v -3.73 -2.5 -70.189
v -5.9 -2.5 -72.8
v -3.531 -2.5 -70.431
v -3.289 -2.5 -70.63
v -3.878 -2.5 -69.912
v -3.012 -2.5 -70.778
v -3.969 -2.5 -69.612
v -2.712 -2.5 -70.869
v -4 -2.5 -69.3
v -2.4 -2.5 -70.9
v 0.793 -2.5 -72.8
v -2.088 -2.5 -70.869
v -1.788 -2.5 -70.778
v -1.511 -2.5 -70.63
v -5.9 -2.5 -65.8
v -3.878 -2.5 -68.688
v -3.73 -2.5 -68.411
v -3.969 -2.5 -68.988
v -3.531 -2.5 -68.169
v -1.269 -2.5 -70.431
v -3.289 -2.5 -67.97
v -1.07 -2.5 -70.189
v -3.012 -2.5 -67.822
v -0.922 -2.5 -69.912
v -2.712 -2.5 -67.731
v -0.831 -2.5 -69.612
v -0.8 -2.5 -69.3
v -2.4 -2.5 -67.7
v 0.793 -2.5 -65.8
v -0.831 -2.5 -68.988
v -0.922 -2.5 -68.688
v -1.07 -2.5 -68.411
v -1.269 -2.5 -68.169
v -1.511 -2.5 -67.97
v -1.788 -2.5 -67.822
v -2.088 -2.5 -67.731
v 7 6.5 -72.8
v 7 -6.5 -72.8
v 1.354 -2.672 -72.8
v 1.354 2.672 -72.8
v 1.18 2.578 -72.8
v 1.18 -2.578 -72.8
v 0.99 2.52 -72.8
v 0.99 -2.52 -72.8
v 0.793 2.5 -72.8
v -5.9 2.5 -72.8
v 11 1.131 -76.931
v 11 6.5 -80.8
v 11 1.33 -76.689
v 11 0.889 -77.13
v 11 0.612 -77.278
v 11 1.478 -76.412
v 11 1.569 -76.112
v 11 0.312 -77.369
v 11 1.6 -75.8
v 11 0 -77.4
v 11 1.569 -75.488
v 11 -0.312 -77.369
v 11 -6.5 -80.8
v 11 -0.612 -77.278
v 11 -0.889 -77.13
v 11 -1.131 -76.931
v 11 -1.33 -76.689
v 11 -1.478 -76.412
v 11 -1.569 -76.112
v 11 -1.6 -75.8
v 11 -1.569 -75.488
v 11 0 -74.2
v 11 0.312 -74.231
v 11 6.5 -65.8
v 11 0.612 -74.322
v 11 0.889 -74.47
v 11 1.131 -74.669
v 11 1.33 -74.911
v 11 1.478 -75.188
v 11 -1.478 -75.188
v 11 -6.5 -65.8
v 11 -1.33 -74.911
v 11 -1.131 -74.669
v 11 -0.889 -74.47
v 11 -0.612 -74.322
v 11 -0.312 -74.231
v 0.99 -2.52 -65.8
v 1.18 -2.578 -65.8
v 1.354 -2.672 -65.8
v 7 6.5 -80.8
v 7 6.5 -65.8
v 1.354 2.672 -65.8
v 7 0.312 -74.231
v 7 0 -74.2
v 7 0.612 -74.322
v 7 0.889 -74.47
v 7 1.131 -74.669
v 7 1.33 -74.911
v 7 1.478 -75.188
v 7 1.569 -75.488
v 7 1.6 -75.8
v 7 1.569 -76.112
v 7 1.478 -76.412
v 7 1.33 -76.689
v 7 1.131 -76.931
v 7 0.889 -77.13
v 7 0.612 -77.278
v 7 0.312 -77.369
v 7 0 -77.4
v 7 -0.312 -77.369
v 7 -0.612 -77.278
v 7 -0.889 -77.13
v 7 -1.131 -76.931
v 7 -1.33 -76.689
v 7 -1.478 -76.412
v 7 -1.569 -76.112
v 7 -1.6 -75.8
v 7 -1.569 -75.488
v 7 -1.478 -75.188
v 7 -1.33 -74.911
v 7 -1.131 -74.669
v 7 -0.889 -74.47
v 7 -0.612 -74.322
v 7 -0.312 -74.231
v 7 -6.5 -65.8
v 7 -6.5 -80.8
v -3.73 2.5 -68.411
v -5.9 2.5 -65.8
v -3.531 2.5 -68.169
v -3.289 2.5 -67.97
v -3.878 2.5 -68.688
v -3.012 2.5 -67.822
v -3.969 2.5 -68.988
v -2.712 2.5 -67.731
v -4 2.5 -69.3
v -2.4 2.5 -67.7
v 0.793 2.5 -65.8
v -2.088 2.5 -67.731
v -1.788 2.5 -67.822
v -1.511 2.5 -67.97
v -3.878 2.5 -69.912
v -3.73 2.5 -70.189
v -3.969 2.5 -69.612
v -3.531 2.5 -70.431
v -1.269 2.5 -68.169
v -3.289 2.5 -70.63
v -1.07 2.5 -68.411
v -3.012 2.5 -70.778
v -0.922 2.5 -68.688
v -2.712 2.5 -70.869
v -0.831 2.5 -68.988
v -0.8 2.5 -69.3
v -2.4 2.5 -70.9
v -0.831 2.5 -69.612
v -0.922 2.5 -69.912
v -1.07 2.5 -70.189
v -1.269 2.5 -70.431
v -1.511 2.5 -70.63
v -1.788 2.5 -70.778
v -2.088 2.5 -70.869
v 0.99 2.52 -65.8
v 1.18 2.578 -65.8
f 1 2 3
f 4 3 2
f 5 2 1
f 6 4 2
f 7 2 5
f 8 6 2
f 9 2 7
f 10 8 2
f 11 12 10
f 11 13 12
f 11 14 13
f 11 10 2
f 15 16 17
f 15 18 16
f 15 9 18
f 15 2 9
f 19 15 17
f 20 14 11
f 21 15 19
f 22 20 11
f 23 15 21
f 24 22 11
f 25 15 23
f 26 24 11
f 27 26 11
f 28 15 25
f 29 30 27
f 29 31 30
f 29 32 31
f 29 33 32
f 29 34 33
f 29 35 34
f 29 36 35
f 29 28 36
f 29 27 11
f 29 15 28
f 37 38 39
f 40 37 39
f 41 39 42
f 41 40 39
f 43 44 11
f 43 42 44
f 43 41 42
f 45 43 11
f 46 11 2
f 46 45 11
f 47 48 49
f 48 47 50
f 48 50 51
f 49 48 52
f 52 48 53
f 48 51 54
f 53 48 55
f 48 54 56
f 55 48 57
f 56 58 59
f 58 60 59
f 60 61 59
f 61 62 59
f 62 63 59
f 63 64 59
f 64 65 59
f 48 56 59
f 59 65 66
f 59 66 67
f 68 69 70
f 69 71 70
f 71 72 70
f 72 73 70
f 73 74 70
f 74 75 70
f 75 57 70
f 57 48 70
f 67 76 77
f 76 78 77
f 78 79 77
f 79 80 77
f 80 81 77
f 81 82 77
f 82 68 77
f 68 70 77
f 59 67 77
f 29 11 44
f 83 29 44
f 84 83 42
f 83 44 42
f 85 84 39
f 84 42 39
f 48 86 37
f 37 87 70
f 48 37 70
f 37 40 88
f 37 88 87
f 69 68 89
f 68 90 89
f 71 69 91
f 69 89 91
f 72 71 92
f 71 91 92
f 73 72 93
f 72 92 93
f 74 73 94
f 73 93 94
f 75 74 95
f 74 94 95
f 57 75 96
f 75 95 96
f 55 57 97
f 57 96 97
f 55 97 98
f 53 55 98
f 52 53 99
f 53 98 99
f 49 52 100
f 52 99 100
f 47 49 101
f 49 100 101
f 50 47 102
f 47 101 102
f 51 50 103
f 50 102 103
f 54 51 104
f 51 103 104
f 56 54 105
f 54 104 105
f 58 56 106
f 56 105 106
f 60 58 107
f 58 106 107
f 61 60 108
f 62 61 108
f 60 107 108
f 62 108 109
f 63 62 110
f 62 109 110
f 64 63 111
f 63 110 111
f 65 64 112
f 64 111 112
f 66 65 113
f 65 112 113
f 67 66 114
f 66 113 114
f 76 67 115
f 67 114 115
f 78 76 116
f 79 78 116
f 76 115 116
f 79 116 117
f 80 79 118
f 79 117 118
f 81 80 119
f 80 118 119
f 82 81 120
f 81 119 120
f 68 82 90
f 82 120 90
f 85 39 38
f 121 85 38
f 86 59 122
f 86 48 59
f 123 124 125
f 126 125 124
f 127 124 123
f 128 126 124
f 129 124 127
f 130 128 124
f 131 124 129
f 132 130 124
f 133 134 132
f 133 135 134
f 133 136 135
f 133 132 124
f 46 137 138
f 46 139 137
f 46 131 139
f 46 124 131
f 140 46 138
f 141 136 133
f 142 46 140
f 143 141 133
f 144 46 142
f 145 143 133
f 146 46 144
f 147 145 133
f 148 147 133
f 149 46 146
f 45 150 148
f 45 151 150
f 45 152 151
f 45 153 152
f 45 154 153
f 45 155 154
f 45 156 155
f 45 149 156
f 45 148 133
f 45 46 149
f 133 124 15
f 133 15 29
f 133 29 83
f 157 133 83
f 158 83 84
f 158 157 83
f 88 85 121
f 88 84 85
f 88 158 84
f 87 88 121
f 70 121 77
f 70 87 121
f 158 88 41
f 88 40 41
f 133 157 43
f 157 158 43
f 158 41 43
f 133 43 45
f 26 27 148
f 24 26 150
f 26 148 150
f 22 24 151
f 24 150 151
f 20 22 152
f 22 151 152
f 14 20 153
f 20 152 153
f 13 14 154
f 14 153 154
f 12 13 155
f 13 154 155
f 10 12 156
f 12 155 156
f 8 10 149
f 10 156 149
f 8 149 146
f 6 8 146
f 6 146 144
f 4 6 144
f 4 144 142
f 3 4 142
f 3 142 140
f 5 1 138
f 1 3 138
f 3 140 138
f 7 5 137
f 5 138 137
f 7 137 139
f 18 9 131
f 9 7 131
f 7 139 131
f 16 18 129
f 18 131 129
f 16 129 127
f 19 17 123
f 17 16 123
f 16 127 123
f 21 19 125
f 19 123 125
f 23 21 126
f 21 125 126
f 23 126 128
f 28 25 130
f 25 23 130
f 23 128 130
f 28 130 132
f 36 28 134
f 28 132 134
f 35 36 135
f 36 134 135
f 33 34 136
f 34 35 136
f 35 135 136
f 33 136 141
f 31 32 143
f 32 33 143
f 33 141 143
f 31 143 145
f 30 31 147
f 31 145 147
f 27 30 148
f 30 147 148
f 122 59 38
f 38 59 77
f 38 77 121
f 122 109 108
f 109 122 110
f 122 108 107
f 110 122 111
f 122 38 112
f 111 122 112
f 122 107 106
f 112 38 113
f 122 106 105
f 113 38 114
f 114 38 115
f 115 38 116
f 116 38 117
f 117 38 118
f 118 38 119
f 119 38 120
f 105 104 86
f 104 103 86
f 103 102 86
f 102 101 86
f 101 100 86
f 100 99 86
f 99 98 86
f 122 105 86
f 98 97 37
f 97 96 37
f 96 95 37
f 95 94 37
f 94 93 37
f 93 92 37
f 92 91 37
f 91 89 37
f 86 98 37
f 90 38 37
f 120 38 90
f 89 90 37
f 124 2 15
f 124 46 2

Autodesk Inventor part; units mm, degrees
ref_plane "YZ Plane" through (0, 0, 0) normal (1, 0, 0) x (0, 1, 0)
ref_plane "XZ Plane" through (0, 0, 0) normal (0, 1, 0) x (-1, 0, 0)
ref_plane "XY Plane" through (0, 0, 0) normal (0, 0, 1) x (1, 0, 0)
sketch "Sketch1" plane through (0, 0, 0) normal (1, 0, 0) x (0, 1, 0)
  circle A0 centre (0, 0) radius 1.6
  line L0 (0, 0) -> (0, -66.3)
  circle A1 centre (0, -66.3) radius 1.6
  line L1 (0, 0) -> (3.5, 0)
  line L2 (3.5, 0) -> (3.5, 3.5)
  line L3 (3.5, 3.5) -> (-3.5, 3.5)
  line L4 (-3.5, 3.5) -> (-3.5, -3.5)
  line L5 (-3.5, -3.5) -> (3.5, -3.5)
  line L6 (3.5, -3.5) -> (3.5, 0)
  line L7 (0, -66.3) -> (3.5, -66.3)
  line L8 (3.5, -66.3) -> (3.5, -62.8)
  line L9 (3.5, -62.8) -> (-3.5, -62.8)
  line L10 (-3.5, -62.8) -> (-3.5, -69.8)
  line L11 (-3.5, -69.8) -> (3.5, -69.8)
  line L12 (3.5, -69.8) -> (3.5, -66.3)
  line L13 (3.5, 3.5) -> (3.5, 6.5)
  line L14 (3.5, 6.5) -> (-3.5, 6.5)
  line L15 (-3.5, 6.5) -> (-3.5, 3.5)
  line L16 (3.5, -69.8) -> (3.5, -72.8)
  line L17 (3.5, -72.8) -> (-3.5, -72.8)
  line L18 (-3.5, -72.8) -> (-3.5, -69.8)
  dimension "d0" = 3.2
  dimension "d1" = 66.3
  dimension "d2" = 3.2
  dimension "d3" = 3.5
  dimension "d4" = 3.5
  dimension "d5" = 7
  dimension "d6" = 7
  dimension "d7" = 3.5
  dimension "d8" = 3.5
  dimension "d9" = 7
  dimension "d10" = 7
  dimension "d11" = 3
  dimension "d12" = 3
extrude "Extrusion1" add sketch "Sketch1" along normal blind 3 contours L1 L6 L5 L0 A0 | A0 L0 L5 L4 L3 L2 L1 | L9 L8 L7 A1 L0 | L0 A1 L7 L12 L11 L10 L9 | L3 L15 L14 L13 | L11 L16 L17 L18
sketch "Sketch2" plane through (3, 0, 0) normal (1, 0, 0) x (0, 0, -1)
  line L0 (-6.5, 3.5) -> (-6.5, -3.5) projected
  line L1 (-6.5, -3.5) -> (3.5, -3.5) projected
  line L2 (3.5, -3.5) -> (3.5, 3.5) projected
  line L3 (3.5, 3.5) -> (-6.5, 3.5) projected
  circle A0 centre (0, 0) radius 1.6 projected
  line L4 (62.8, -3.5) -> (72.8, -3.5) projected
  line L5 (72.8, -3.5) -> (72.8, 3.5) projected
  line L6 (72.8, 3.5) -> (62.8, 3.5) projected
  line L7 (62.8, 3.5) -> (62.8, -3.5) projected
  circle A1 centre (66.3, 0) radius 1.6 projected
  line L8 (-6.5, 3.5) -> (-6.5, -3.5) projected
  line L9 (-6.5, 3.5) -> (-2.5, 3.5)
  line L10 (3.5, 3.5) -> (-6.5, 3.5) projected
  line L11 (-2.5, 3.5) -> (-2.5, -3.5)
  line L12 (-6.5, -3.5) -> (3.5, -3.5) projected
  line L13 (-2.5, -3.5) -> (-6.5, -3.5)
  line L14 (72.8, 3.5) -> (68.8, 3.5)
  line L15 (72.8, 3.5) -> (62.8, 3.5) projected
  line L16 (68.8, 3.5) -> (68.8, -3.5)
  line L17 (62.8, -3.5) -> (72.8, -3.5) projected
  line L18 (72.8, -3.5) -> (68.8, -3.5)
  dimension "d15" = 4
  dimension "d16" = 4
extrude "Extrusion2" add sketch "Sketch2" along normal blind 10 contours L3 L11 L1 L0 | L16 L6 L5 L4
sketch "Sketch3" plane through (0, 0, 0) normal (-1, 0, 0) x (0, 0, 1)
  line L0 (6.5, 3.5) -> (6.5, -3.5) projected
  line L1 (-3.5, 3.5) -> (6.5, 3.5) projected
  line L2 (-3.5, -3.5) -> (-3.5, 3.5) projected
  line L3 (6.5, -3.5) -> (-3.5, -3.5) projected
  circle A0 centre (0, 0) radius 1.6 projected
extrude "Extrusion3" cut sketch "Sketch3" against normal through all
sketch "Sketch4" plane through (0, -3.5, -72.8) normal (0, -1, 0) x (1, 0, 0)
  line L0 (0, 10) -> (0, 0) projected
  line L1 (0, 0) -> (13, 0) projected
  line L2 (13, 4) -> (13, 0) projected
  line L3 (3, 4) -> (13, 4) projected
  line L4 (3, 10) -> (3, 4) projected
  line L5 (0, 10) -> (3, 10) projected
  point P0 (0, 72.8)
extrude "Extrusion4" add sketch "Sketch4" along normal blind 3
sketch "Sketch5" plane through (0, 3.5, -62.8) normal (0, 1, 0) x (1, 0, 0)
  line L0 (0, 10) -> (0, 0) projected
  line L1 (0, 0) -> (3, 0) projected
  line L2 (3, 6) -> (3, 0) projected
  line L3 (3, 6) -> (13, 6) projected
  line L4 (13, 10) -> (13, 6) projected
  line L5 (0, 10) -> (13, 10) projected
  point P0 (0, -62.8)
extrude "Extrusion5" add sketch "Sketch5" along normal blind 3
sketch "Sketch6" plane through (13, 0, 0) normal (1, 0, 0) x (0, 0, -1)
  line L0 (68.8, -6.5) -> (68.8, 6.5) projected
  line L1 (72.8, -6.5) -> (68.8, -6.5) projected
  line L2 (72.8, 6.5) -> (72.8, -6.5) projected
  line L3 (68.8, 6.5) -> (72.8, 6.5) projected
  point P0 (0, 0)
extrude "Extrusion6" cut sketch "Sketch6" against normal blind 2
sketch "Sketch7" plane through (0, -6.5, -72.8) normal (0, 0, -1) x (-1, 0, 0)
  line L0 (0, 0) -> (-11, 0) projected
  line L1 (-11, 0) -> (-7, 0)
  line L2 (-7, 0) -> (-7, 13.1195)
  line L3 (-3, 0) -> (-3, 13) projected
  line L4 (-11, 13) -> (-11, 0) projected
  line L5 (0, 0) -> (-11, 0) projected
  line L6 (0, 13) -> (0, 0) projected
  line L7 (-11, 13) -> (0, 13) projected
  point P0 (0, 6.5)
  point P1 (-7, 13)
  dimension "d27" = 4
extrude "Extrusion7" add sketch "Sketch7" along normal blind 6 contours L0 L4 L7 L2
sketch "Sketch8" plane through (7, -6.5, -72.8) normal (-1, 0, 0) x (0, 0, 1)
  line L0 (0, 13) -> (0, 0) projected
  line L1 (0, 13) -> (-6, 13) projected
  line L2 (-6, 0) -> (-6, 13) projected
  line L3 (0, 0) -> (-6, 0) projected
  line L4 (-6, 13) -> (-6, 0) projected
  line L5 (-6, 0) -> (-6, 6.5)
  line L6 (-6, 6.5) -> (-3, 6.5)
  circle A0 centre (-3, 6.5) radius 1.6
  point P0 (72.8, 6.5)
  dimension "d30" = 6.5
  dimension "d31" = 3
  dimension "d32" = 3.2
extrude "Extrusion8" cut sketch "Sketch8" against normal blind 6 contours A0
sketch "Sketch9" plane through (3, 0, 0) normal (1, 0, 0) x (0, 0, -1)
  circle A0 centre (66.3, 0) radius 1.6 projected
  line L0 (68.8, -6.5) -> (68.8, 6.5) projected
  line L1 (62.8, 6.5) -> (68.8, 6.5) projected
  line L2 (62.8, -6.5) -> (62.8, 6.5) projected
  line L3 (68.8, -6.5) -> (62.8, -6.5) projected
  point P0 (0, 0)
extrude "Extrusion9" cut sketch "Sketch9" against normal blind 6
sketch "Sketch10" plane through (0, 0, 0) normal (-1, 0, 0) x (0, 0, 1)
  line L0 (-68.8, -6.5) -> (-68.8, 6.5) projected
  line L1 (-72.8, 6.5) -> (-68.8, 6.5) projected
  line L2 (-72.8, 6.5) -> (-72.8, -6.5) projected
  line L3 (-68.8, -6.5) -> (-72.8, -6.5) projected
  point P0 (0, 0)
extrude "Extrusion10" add sketch "Sketch10" along normal blind 5.9
sketch "Sketch11" plane through (7, -6.5, -72.8) normal (0, 0, -1) x (-1, 0, 0)
  line L0 (0, 13) -> (0, 0) projected
  line L1 (0, 0) -> (12.9, 0) projected
  line L2 (12.9, 13) -> (12.9, 0) projected
  line L3 (0, 13) -> (12.9, 13) projected
  line L4 (-4, 0) -> (12.9, 0) projected
  line L5 (12.9, 0) -> (12.9, 5)
  line L6 (12.9, 13) -> (12.9, 0) projected
  line L7 (12.9, 5) -> (12.9, 8)
  line L8 (12.9, 8) -> (6.9, 8)
  line L9 (0, 0) -> (0, 13) projected
  line L10 (6.9, 8) -> (0, 13)
  line L11 (12.9, 5) -> (6.9, 5)
  line L12 (-4, 0) -> (0, 0) projected
  line L13 (6.9, 5) -> (0, 0)
  point P0 (7, 6.5)
  dimension "d39" = 5
  dimension "d40" = 3
  dimension "d41" = 6
extrude "Extrusion11" cut sketch "Sketch11" against normal blind 5.9 contours L3 L2 L8 L10 | L13 L11 L2 L1
sketch "Sketch12" plane through (11, -6.5, -68.8) normal (0, 0, 1) x (1, 0, 0)
  line L0 (-10.9, 5) -> (-4, 0) projected
  line L1 (0, 0) -> (-4, 0) projected
  line L2 (0, 0) -> (0, 13) projected
  line L3 (0, 13) -> (-4, 13) projected
  line L4 (-4, 13) -> (-10.9, 8) projected
  line L5 (-10.9, 8) -> (-16.9, 8) projected
  line L6 (-16.9, 5) -> (-16.9, 8) projected
  line L7 (-16.9, 5) -> (-10.9, 5) projected
  point P0 (-11, 6.5)
extrude "Extrusion12" add sketch "Sketch12" along normal blind 3
sketch "Sketch13" plane through (-5.9, -1.5, -72.8) normal (0, -1, 0) x (1, 0, 0)
  line L0 (6, 0) -> (0, 0) projected
  line L1 (0, 0) -> (0, 3.5)
  line L2 (0, 0) -> (0, 7) projected
  line L3 (0, 0) -> (0, 7) projected
  line L4 (6, 0) -> (0, 0) projected
  line L5 (6, 0) -> (6, 7) projected
  line L6 (0, 7) -> (6, 7) projected
  line L7 (0, 3.5) -> (3.5, 3.5)
  circle A0 centre (3.5, 3.5) radius 1.6
  point P0 (5.9, 72.8)
  dimension "d46" = 3.5
  dimension "d47" = 3.5
  dimension "d48" = 3.2
extrude "Extrusion13" cut sketch "Sketch13" against normal through all contours A0
sketch "Sketch14" plane through (11, -6.5, -65.8) normal (0, 0, 1) x (1, 0, 0)
  line L0 (-10.9, 5) -> (-4, 0) projected
  line L1 (-4, 0) -> (0, 0) projected
  line L2 (0, 0) -> (0, 13) projected
  line L3 (0, 13) -> (-4, 13) projected
  line L4 (-4, 13) -> (-10.9, 8) projected
  line L5 (-10.9, 8) -> (-16.9, 8) projected
  line L6 (-16.9, 8) -> (-16.9, 5) projected
  line L7 (-16.9, 5) -> (-10.9, 5) projected
  line L8 (-4, 13) -> (-10.9, 8) projected
  line L9 (-10.9, 8) -> (-9.9, 8)
  line L10 (-9.9, 8) -> (-4, 13)
  line L11 (-4, 0) -> (-10.9, 5) projected
  line L12 (-10.9, 5) -> (-9.9, 5)
  line L13 (-9.9, 5) -> (-4, 0)
  point P0 (-11, 6.5)
  dimension "d52" = 1
extrude "Extrusion14" cut sketch "Sketch14" against normal blind 10 contours L12 L13 L0 | L4 L10 L9
sketch "Sketch15" plane through (0, -6.5, -78.8) normal (0, 0, -1) x (-1, 0, 0)
  line L0 (-11, 0) -> (-7, 0) projected
  line L1 (-7, 0) -> (-7, 13) projected
  line L2 (-7, 13) -> (-11, 13) projected
  line L3 (-11, 13) -> (-11, 0) projected
  point P0 (0, 6.5)
extrude "Extrusion15" add sketch "Sketch15" along normal blind 2
sketch "Sketch16" plane through (-5.9, 1.5, -65.8) normal (0, 1, 0) x (1, 0, 0)
  circle A0 centre (3.5, 3.5) radius 1.6 projected
  line L0 (0, 7) -> (7, 7) projected
  line L1 (0, 0) -> (0, 7) projected
  line L2 (7, 0) -> (0, 0) projected
  line L3 (7, 0) -> (7, 7) projected
  point P0 (5.9, -65.8)
extrude "Extrusion16" add sketch "Sketch16" along normal blind 1
sketch "Sketch17" plane through (-5.9, -1.5, -72.8) normal (0, -1, 0) x (1, 0, 0)
  circle A0 centre (3.5, 3.5) radius 1.6 projected
  line L0 (0, 0) -> (0, 7) projected
  line L1 (7, 0) -> (0, 0) projected
  line L2 (7, 7) -> (7, 0) projected
  line L3 (0, 7) -> (7, 7) projected
  point P0 (5.9, 72.8)
extrude "Extrusion17" add sketch "Sketch17" along normal blind 1
sketch "Sketch18" plane through (7, -6.5, -72.8) normal (0, 0, -1) x (-1, 0, 0)
  line L0 (12.9, 9) -> (12.9, 4) projected
  line L1 (5.9, 9) -> (12.9, 9) projected
  line L2 (5.9, 8) -> (5.9, 9) projected
  line L3 (5.9, 8) -> (0, 13) projected
  line L4 (0, 13) -> (0, 0) projected
  line L5 (0, 0) -> (5.9, 5) projected
  line L6 (5.9, 5) -> (5.9, 4) projected
  line L7 (12.9, 4) -> (5.9, 4) projected
  line L8 (5.9, 4) -> (0, 0)
  line L9 (12.9, 9) -> (5.9, 9) projected
  line L10 (0, 13) -> (5.9, 8) projected
  line L11 (5.9, 9) -> (0, 13)
  point P0 (7, 6.5)
extrude "Extrusion18" add sketch "Sketch18" against normal blind 7 contours L2 L3 L11 | L8 L5 L6
fillet "Fillet3" radius 1 2 edges at (1.1, -2.5, -69.3) (1.1, 2.5, -69.3)
properties part number "base_servos"
